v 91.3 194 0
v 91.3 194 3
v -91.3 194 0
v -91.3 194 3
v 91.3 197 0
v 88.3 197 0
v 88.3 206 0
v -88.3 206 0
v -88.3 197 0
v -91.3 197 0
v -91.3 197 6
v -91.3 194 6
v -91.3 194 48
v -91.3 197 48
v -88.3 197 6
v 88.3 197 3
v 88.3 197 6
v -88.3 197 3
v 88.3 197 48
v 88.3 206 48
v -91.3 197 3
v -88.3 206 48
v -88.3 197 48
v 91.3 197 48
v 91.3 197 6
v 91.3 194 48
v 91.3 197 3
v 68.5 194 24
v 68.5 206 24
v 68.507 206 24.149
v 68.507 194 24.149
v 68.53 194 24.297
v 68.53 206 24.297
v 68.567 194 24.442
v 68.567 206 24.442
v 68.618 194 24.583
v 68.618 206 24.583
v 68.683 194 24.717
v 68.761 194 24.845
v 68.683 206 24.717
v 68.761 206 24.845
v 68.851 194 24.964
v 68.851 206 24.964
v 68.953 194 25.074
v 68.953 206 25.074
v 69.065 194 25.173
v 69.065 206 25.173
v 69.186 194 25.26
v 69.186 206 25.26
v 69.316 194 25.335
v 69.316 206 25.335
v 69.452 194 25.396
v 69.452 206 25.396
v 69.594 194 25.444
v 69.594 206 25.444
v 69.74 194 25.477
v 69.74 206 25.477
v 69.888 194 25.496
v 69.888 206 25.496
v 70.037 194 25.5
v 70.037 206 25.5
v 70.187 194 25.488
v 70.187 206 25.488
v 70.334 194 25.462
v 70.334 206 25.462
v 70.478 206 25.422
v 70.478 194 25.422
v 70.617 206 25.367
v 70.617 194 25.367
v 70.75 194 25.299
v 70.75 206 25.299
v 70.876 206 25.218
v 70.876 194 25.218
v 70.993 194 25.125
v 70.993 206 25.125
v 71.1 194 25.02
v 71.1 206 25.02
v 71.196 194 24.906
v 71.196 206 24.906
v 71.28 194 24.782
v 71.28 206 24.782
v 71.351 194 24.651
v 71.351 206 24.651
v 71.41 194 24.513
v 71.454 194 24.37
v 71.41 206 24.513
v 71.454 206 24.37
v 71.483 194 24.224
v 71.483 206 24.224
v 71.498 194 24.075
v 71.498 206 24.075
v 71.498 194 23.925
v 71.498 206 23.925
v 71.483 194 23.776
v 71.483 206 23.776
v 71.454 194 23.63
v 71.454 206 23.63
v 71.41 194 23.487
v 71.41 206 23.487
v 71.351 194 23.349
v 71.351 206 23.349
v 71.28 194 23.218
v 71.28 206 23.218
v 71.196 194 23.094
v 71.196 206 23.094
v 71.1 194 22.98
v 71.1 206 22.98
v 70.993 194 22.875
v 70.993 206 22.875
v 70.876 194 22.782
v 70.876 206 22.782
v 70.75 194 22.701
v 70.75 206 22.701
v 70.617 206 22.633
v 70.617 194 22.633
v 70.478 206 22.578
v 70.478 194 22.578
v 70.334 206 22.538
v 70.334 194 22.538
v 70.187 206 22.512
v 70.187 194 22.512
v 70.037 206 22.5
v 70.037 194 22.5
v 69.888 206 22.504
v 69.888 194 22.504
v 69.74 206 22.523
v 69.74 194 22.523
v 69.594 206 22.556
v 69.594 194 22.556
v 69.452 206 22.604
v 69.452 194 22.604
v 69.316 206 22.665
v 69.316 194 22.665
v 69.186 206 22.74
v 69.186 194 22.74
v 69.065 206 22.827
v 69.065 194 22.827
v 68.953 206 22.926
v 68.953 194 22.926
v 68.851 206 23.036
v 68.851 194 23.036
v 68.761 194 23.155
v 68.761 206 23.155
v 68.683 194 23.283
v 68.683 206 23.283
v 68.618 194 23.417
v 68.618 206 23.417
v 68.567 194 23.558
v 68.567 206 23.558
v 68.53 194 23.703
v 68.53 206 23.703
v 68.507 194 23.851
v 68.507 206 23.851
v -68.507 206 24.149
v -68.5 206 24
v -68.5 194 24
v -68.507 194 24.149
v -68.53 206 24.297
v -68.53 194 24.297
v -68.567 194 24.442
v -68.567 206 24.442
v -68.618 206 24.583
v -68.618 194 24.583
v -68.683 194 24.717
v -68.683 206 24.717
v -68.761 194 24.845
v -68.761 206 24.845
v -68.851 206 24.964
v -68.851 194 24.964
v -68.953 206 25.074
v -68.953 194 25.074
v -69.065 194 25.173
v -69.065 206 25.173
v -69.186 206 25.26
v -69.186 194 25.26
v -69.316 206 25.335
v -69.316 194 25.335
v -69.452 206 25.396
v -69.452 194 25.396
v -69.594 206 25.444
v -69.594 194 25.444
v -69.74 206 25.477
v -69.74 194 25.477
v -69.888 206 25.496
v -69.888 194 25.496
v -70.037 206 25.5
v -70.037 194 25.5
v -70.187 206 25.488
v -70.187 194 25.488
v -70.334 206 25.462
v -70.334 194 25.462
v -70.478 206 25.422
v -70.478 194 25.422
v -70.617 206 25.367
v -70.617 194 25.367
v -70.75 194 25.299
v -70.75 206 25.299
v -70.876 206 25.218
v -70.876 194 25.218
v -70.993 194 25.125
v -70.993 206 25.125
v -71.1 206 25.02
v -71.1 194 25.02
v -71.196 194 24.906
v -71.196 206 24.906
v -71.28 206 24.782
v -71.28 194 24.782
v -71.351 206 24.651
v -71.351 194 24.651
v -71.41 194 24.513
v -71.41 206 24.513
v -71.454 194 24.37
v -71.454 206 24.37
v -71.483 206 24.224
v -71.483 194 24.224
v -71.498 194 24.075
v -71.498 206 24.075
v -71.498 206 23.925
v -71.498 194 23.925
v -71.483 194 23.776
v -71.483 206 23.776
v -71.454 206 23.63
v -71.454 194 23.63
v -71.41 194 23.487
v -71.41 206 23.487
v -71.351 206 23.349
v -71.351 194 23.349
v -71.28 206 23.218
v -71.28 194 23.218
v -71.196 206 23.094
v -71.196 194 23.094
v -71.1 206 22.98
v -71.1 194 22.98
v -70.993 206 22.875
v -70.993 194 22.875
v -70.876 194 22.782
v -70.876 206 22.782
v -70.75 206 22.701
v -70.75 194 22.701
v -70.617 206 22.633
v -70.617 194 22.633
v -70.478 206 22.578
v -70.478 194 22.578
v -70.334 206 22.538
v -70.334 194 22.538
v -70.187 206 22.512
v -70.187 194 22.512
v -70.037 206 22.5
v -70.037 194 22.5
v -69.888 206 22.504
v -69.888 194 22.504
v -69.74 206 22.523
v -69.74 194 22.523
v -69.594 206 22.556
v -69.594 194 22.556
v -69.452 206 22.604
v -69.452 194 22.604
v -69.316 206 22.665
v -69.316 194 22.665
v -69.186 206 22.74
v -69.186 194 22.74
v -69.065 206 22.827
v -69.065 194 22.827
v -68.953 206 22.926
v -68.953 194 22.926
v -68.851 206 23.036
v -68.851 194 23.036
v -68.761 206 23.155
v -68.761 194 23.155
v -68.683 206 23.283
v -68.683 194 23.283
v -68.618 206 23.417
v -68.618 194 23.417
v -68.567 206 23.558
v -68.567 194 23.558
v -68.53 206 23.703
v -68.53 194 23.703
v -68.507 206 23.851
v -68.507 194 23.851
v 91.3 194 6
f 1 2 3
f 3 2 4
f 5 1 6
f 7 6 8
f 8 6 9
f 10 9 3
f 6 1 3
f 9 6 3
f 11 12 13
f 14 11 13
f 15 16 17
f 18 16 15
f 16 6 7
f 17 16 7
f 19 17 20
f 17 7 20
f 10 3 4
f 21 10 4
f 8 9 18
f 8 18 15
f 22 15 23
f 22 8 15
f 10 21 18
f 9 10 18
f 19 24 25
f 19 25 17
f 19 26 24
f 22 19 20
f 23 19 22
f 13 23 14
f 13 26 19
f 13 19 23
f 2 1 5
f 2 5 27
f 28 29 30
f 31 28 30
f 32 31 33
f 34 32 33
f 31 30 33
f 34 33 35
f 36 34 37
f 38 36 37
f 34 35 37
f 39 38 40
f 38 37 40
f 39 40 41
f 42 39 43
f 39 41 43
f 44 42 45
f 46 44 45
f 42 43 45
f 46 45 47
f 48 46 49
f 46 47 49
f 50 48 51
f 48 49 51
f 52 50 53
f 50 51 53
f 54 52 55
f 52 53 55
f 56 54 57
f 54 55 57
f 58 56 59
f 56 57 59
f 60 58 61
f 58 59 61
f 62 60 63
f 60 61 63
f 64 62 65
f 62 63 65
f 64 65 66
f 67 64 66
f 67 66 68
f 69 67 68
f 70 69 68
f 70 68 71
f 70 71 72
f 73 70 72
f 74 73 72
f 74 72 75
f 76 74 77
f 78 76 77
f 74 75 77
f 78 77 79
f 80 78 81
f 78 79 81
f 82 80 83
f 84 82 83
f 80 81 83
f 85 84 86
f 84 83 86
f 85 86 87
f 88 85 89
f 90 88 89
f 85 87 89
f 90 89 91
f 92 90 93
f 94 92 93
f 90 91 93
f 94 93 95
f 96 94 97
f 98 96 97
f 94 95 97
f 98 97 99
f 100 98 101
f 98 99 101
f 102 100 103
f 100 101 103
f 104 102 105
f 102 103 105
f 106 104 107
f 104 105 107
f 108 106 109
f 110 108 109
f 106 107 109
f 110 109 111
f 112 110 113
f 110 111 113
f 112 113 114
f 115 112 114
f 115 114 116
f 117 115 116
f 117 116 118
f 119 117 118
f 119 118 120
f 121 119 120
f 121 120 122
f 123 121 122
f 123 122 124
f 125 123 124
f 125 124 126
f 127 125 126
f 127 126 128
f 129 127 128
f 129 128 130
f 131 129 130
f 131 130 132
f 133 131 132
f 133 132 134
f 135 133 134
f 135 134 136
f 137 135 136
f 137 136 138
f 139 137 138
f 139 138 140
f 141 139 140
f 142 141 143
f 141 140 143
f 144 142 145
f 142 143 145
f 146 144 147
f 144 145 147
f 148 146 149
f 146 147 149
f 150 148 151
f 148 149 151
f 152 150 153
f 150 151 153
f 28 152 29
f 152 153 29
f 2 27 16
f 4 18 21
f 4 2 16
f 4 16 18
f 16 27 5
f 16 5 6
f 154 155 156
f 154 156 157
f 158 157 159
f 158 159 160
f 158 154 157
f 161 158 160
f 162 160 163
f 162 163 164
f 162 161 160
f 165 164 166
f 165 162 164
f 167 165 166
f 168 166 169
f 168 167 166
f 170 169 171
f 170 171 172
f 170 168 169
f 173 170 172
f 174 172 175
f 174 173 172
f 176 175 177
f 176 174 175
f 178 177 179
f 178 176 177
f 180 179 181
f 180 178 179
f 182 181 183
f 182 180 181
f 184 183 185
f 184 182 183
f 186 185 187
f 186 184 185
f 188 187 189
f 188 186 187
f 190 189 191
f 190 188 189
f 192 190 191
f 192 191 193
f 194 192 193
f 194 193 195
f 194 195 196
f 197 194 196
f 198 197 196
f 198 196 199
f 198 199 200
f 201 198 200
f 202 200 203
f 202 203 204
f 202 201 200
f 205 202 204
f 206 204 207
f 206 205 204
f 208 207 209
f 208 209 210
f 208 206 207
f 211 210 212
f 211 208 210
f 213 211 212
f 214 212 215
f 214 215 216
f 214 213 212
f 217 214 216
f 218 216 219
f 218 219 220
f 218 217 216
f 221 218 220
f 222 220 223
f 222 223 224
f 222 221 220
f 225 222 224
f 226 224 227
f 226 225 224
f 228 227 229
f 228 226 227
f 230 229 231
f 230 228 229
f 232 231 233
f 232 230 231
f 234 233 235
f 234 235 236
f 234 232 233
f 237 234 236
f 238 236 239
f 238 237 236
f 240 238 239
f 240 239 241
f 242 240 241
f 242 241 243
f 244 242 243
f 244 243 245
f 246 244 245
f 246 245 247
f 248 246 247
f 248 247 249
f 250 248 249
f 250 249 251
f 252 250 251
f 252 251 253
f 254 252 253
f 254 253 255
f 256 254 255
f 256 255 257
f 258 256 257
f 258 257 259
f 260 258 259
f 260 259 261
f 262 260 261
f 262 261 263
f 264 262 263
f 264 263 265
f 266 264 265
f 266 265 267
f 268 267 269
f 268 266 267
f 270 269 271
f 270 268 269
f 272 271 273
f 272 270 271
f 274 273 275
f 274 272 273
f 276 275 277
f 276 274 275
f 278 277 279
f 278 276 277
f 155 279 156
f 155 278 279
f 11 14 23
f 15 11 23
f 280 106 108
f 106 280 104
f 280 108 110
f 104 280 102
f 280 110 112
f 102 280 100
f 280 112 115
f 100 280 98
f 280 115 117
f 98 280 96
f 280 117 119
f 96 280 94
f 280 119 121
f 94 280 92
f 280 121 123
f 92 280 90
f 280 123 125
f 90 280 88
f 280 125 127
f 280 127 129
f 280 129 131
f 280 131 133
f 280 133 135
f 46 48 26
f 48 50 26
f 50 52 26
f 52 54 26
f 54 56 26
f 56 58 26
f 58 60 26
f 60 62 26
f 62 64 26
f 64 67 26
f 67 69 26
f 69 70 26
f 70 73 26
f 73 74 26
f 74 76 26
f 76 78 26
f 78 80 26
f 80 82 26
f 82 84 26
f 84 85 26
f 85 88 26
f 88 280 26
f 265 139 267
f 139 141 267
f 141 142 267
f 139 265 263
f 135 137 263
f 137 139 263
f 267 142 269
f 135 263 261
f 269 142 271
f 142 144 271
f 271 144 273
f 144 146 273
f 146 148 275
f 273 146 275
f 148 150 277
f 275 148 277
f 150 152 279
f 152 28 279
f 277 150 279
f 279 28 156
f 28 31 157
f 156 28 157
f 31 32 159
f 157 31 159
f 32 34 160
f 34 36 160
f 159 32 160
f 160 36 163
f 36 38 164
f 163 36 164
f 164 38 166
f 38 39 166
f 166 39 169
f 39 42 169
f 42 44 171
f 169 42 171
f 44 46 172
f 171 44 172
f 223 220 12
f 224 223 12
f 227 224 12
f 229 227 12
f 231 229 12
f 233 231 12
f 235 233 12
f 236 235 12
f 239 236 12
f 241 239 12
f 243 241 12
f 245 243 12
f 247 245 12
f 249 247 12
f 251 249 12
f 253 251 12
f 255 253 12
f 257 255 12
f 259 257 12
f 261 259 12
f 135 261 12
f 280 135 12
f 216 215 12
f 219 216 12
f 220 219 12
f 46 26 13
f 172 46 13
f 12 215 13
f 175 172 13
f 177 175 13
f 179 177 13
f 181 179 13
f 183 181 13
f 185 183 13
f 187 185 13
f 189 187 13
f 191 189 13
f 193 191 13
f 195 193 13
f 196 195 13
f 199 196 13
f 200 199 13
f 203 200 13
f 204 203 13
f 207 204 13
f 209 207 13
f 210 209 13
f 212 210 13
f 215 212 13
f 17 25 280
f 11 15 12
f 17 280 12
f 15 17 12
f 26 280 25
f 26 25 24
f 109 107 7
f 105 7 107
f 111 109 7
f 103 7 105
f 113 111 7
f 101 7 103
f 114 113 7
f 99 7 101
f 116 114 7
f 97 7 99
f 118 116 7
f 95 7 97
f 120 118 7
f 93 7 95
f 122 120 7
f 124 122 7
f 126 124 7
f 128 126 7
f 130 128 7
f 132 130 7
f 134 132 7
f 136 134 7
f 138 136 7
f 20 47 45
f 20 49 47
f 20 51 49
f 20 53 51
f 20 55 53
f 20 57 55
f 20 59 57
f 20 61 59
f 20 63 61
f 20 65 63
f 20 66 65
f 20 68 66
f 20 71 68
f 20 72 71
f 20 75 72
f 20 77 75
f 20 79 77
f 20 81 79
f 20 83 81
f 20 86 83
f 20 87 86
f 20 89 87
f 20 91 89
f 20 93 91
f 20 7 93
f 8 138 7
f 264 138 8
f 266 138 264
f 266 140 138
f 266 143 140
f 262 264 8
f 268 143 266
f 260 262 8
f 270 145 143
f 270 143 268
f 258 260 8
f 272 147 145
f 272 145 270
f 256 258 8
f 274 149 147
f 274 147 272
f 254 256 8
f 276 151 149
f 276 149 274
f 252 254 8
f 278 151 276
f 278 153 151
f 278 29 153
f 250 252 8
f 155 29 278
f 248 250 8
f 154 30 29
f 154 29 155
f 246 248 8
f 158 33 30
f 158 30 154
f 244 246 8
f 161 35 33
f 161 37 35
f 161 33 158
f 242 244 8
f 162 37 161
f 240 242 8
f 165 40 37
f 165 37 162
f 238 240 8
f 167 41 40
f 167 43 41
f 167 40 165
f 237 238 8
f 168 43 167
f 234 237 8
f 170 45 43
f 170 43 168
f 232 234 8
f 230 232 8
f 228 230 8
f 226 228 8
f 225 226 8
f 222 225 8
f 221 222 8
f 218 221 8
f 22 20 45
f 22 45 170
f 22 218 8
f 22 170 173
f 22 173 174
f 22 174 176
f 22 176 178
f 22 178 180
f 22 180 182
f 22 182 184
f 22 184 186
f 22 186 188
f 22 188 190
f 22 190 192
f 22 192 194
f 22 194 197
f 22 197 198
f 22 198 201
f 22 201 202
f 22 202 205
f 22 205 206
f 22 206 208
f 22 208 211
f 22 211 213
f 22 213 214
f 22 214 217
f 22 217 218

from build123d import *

# Parameters (mm, degrees)
SKETCH047_W             = 182.6
SKETCH047_H             = 48
PAD017_DEPTH            = 12
SKETCH048_W             = 3
SKETCH048_H             = 48
POCKET030_DEPTH         = 9
SKETCH049_W             = 182.6
SKETCH049_H             = 3
POCKET031_DEPTH         = 3
SKETCH054_R             = 1.5
POCKET033_DEPTH         = 12
BODY015_PLACEMENT_ANGLE = 90
BODY018_PLACEMENT_ANGLE = 180


with BuildPart() as part:
    # Sketch047 → Pad017 (new body)
    with BuildSketch(Plane.XY):
        with Locations((0, 24)):
            Rectangle(SKETCH047_W, SKETCH047_H)
    extrude(amount=PAD017_DEPTH)

    # Sketch048 (on Face6 of Pad017) → Pocket030 (cut)
    with BuildSketch(Plane.XY.offset(12)):
        with Locations((-89.8, 24)):
            Rectangle(SKETCH048_W, SKETCH048_H)
    pocket030 = extrude(amount=-POCKET030_DEPTH, mode=Mode.SUBTRACT)

    # Mirrored002: Pocket030 across Sketch048 V_Axis
    add(pocket030.mirror(Plane(origin=(0, 0, 12), x_dir=(0, 0, 1), z_dir=(1, 0, 0))), mode=Mode.SUBTRACT)

    # Sketch049 (on Face2 of Mirrored002) → Pocket031 (cut)
    with BuildSketch(Plane(origin=(0, 0, 0), x_dir=(1, 0, 0), z_dir=(0, 0, -1))):
        with Locations((0, -4.5)):
            Rectangle(SKETCH049_W, SKETCH049_H)
    extrude(amount=-POCKET031_DEPTH, mode=Mode.SUBTRACT)

    # Sketch054 (on Face6 of Pocket031) → Pocket033 (cut)
    with BuildSketch(Plane.XY.offset(12)):
        with Locations((-70, 24)):
            Circle(SKETCH054_R)
    pocket033 = extrude(amount=-POCKET033_DEPTH, mode=Mode.SUBTRACT)

    # Mirrored003: Pocket033 across Sketch054 V_Axis
    add(pocket033.mirror(Plane(origin=(0, 0, 12), x_dir=(0, 0, 1), z_dir=(1, 0, 0))), mode=Mode.SUBTRACT)


with BuildPart() as part_1:
    # Body015 placement: moved
    add(part.part.moved(Location((0, 12, 0))).rotate(Axis((0, 12, 0), (1, 0, 0)), BODY015_PLACEMENT_ANGLE))


with BuildPart() as part_2:
    # Body018 placement: moved
    add(part_1.part.moved(Location((0, 206, 0))).rotate(Axis((0, 206, 0), (0, 0, 1)), BODY018_PLACEMENT_ANGLE))


solid = part_2.part
